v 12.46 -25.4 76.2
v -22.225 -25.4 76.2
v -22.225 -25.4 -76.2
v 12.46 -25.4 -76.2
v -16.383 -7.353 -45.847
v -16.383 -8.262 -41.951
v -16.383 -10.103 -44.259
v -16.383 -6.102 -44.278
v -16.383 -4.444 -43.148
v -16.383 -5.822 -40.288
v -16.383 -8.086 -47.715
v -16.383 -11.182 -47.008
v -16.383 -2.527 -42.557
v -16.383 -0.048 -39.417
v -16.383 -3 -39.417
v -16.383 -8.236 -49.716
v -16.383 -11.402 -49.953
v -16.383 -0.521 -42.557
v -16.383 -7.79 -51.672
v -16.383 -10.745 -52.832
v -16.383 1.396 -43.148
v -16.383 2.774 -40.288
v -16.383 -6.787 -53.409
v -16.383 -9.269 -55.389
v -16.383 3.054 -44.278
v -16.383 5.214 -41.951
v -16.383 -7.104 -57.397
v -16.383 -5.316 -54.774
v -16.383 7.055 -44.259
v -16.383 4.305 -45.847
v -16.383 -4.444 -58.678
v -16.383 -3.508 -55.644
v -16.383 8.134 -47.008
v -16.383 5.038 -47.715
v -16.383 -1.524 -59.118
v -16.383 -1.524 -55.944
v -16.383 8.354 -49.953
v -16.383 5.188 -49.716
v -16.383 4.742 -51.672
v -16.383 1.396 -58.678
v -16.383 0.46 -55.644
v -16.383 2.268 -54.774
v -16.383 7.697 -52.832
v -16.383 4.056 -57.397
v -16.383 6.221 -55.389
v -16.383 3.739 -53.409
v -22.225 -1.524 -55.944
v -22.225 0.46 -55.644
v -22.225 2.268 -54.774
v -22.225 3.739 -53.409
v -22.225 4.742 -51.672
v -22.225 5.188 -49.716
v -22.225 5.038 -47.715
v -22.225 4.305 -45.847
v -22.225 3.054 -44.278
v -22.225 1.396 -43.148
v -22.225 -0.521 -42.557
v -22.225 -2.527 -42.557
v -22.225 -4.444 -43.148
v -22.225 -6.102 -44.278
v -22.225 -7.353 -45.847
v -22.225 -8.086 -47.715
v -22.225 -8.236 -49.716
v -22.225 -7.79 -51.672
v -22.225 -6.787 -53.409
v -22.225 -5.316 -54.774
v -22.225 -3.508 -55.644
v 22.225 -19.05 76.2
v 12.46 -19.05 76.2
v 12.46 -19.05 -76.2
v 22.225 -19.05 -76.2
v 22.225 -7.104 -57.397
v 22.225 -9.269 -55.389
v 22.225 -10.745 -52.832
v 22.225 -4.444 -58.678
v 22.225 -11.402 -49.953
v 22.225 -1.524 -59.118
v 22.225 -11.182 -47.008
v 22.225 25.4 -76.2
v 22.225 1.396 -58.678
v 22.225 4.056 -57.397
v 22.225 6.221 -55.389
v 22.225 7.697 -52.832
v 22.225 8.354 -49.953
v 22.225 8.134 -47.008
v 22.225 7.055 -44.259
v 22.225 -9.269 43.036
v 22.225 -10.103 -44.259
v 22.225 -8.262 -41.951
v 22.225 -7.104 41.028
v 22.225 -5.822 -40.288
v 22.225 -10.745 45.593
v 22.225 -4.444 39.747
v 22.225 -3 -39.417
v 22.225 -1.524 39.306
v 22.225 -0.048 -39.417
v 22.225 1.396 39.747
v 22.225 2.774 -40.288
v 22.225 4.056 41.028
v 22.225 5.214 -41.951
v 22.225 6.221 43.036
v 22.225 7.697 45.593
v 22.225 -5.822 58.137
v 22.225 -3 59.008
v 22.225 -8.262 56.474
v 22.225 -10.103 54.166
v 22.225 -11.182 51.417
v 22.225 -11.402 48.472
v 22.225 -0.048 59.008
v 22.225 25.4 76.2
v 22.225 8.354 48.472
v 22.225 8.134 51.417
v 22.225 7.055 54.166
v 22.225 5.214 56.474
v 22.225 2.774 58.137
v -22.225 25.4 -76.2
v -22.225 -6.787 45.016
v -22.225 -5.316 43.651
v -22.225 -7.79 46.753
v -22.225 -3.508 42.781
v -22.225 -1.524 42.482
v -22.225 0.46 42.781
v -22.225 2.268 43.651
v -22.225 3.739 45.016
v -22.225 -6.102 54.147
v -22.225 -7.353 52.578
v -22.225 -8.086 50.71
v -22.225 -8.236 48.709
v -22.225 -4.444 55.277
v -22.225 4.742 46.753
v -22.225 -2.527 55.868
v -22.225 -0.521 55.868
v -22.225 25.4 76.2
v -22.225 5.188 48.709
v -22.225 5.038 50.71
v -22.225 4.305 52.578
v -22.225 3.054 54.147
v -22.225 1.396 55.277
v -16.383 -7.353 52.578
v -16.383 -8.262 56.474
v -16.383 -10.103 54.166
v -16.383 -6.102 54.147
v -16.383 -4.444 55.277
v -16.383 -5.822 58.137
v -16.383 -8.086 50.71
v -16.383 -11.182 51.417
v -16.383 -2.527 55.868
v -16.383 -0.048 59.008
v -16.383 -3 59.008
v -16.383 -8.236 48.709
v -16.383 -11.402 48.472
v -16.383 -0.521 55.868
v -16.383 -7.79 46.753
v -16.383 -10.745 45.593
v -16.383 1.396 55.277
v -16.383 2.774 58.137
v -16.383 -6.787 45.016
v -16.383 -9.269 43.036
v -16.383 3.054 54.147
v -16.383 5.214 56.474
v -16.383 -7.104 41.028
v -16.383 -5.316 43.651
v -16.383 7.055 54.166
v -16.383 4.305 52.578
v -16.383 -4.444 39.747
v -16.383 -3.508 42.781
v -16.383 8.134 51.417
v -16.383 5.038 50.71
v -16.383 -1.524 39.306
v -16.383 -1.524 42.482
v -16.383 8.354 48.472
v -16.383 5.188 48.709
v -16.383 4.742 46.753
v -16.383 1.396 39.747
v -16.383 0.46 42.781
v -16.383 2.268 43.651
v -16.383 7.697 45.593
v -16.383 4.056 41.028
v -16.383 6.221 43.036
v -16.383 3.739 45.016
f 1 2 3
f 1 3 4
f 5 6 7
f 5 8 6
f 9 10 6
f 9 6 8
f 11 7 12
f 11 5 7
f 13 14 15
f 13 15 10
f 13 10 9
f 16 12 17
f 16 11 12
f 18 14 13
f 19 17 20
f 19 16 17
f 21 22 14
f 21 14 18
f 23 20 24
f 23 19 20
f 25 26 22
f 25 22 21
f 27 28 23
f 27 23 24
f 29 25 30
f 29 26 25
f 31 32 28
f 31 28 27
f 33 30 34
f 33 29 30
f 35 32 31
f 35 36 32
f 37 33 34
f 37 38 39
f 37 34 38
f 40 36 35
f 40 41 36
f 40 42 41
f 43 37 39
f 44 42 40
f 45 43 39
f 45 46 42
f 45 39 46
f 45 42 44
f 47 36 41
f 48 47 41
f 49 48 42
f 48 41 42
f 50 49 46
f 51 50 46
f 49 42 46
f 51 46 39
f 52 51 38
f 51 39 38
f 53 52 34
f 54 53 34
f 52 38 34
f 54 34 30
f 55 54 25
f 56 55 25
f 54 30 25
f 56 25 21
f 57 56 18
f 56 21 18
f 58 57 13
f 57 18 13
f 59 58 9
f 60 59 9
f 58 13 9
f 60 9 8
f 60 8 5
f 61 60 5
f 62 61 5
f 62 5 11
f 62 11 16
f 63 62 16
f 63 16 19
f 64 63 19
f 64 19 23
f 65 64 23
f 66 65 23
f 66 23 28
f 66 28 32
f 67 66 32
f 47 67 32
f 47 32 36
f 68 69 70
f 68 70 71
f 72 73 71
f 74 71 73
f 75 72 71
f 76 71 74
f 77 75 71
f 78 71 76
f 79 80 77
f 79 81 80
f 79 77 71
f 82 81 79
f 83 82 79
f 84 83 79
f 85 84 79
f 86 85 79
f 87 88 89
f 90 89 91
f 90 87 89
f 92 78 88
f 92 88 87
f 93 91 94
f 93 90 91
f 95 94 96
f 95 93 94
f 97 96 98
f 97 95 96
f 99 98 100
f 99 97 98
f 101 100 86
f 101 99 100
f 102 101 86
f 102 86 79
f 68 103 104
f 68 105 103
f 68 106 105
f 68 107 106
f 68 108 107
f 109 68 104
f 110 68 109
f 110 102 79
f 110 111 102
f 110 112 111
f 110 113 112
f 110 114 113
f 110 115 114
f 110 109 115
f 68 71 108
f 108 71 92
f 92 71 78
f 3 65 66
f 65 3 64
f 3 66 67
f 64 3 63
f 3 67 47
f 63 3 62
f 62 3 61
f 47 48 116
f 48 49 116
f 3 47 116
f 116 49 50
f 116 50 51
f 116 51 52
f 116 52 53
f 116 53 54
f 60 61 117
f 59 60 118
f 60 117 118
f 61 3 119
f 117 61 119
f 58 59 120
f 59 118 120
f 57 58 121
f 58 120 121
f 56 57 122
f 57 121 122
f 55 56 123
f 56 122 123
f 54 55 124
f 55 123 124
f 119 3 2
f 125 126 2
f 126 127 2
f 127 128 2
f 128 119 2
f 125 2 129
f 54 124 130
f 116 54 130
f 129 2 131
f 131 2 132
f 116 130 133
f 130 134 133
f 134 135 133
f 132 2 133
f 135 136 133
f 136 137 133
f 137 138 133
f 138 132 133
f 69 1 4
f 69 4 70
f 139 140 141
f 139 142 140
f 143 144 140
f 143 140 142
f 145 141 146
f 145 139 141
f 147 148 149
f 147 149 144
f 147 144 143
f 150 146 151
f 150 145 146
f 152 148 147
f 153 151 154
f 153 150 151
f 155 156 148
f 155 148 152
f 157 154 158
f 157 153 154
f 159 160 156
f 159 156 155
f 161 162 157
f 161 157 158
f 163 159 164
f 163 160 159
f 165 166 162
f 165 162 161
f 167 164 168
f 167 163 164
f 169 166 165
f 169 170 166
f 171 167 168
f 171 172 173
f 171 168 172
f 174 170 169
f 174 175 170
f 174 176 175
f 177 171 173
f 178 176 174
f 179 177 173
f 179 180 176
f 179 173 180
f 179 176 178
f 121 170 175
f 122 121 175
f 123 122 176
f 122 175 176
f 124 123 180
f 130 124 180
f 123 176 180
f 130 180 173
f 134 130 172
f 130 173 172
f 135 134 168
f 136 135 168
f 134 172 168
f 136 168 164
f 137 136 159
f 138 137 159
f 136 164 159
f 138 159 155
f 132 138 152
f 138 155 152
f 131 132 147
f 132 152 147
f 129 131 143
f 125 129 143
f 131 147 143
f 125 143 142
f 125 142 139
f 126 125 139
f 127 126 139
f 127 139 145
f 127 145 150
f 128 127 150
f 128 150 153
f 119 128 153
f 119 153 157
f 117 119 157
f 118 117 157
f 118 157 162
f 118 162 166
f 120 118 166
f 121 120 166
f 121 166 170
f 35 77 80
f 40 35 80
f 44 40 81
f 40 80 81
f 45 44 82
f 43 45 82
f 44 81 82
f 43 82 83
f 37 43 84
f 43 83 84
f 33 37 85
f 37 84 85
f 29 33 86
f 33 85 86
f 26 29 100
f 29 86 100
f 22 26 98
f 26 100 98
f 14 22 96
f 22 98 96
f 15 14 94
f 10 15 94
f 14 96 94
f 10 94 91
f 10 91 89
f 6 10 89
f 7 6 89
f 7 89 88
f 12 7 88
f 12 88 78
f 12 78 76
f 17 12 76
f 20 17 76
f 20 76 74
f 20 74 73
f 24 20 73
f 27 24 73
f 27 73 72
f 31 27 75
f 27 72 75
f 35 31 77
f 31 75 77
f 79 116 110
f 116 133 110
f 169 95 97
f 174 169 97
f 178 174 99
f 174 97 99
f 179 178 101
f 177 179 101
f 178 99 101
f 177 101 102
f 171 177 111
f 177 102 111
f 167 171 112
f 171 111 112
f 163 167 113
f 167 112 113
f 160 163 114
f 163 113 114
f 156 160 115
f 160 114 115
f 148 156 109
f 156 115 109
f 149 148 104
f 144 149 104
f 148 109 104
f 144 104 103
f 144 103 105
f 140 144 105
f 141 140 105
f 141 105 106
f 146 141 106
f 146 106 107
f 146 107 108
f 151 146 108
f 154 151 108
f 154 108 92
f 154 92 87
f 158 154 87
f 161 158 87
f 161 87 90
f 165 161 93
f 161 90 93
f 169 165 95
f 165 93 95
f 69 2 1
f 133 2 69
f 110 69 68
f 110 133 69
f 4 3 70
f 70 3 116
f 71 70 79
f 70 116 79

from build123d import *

# Parameters (mm, degrees)
SKETCH1_W           = 44.45
SKETCH1_H           = 50.8
BOSS_EXTRUDE1_DEPTH = 76.2
CUT_EXTRUDE1_REACH  = 93.801
SKETCH2_R           = 6.731
SKETCH3_R           = 9.906
CUT_EXTRUDE2_DEPTH  = 38.608
SKETCH4_W           = 9.764994968
SKETCH4_H           = 6.35
CUT_EXTRUDE4_DEPTH  = 157.092506627


with BuildPart() as part:
    # Sketch1 → Boss-Extrude1 (new, symmetric)
    with BuildSketch(Plane.XY):
        Rectangle(SKETCH1_W, SKETCH1_H)
    extrude(amount=BOSS_EXTRUDE1_DEPTH, both=True)

    # Sketch2 → Cut-Extrude1 (cut, up to next)
    with BuildSketch(Plane(origin=(22.225, 0, 0), x_dir=(0, 0, -1), z_dir=(1, 0, 0)), mode=Mode.PRIVATE) as cut_extrude1_sk1:
        with Locations((-49.2125, -1.524)):
            Circle(SKETCH2_R)
    cut_extrude1_tool1 = extrude(cut_extrude1_sk1.sketch, amount=-CUT_EXTRUDE1_REACH, mode=Mode.PRIVATE) & part.part
    # Sketch2 → Cut-Extrude1 (cut, up to next)
    with BuildSketch(Plane(origin=(22.225, 0, 0), x_dir=(0, 0, -1), z_dir=(1, 0, 0)), mode=Mode.PRIVATE) as cut_extrude1_sk2:
        with Locations((49.2125, -1.524)):
            Circle(SKETCH2_R)
    cut_extrude1_tool2 = extrude(cut_extrude1_sk2.sketch, amount=-CUT_EXTRUDE1_REACH, mode=Mode.PRIVATE) & part.part
    add(cut_extrude1_tool1.solids().sort_by_distance((22.225, -1.524, 49.2125))[0], mode=Mode.SUBTRACT)
    add(cut_extrude1_tool2.solids().sort_by_distance((22.225, -1.524, -49.2125))[0], mode=Mode.SUBTRACT)

    # Sketch3 → Cut-Extrude2 (cut)
    with BuildSketch(Plane(origin=(22.225, 0, 0), x_dir=(0, 0, -1), z_dir=(1, 0, 0))):
        with Locations((-49.2125, -1.524)):
            Circle(SKETCH3_R)
        with Locations((49.2125, -1.524)):
            Circle(SKETCH3_R)
    extrude(amount=-CUT_EXTRUDE2_DEPTH, mode=Mode.SUBTRACT)

    # Sketch4 → Cut-Extrude4 (cut, through all)
    with BuildSketch(Plane.XY.offset(76.2)):
        with Locations((17.342502516, -22.225)):
            Rectangle(SKETCH4_W, SKETCH4_H)
    extrude(amount=-CUT_EXTRUDE4_DEPTH, mode=Mode.SUBTRACT)


solid = part.part
